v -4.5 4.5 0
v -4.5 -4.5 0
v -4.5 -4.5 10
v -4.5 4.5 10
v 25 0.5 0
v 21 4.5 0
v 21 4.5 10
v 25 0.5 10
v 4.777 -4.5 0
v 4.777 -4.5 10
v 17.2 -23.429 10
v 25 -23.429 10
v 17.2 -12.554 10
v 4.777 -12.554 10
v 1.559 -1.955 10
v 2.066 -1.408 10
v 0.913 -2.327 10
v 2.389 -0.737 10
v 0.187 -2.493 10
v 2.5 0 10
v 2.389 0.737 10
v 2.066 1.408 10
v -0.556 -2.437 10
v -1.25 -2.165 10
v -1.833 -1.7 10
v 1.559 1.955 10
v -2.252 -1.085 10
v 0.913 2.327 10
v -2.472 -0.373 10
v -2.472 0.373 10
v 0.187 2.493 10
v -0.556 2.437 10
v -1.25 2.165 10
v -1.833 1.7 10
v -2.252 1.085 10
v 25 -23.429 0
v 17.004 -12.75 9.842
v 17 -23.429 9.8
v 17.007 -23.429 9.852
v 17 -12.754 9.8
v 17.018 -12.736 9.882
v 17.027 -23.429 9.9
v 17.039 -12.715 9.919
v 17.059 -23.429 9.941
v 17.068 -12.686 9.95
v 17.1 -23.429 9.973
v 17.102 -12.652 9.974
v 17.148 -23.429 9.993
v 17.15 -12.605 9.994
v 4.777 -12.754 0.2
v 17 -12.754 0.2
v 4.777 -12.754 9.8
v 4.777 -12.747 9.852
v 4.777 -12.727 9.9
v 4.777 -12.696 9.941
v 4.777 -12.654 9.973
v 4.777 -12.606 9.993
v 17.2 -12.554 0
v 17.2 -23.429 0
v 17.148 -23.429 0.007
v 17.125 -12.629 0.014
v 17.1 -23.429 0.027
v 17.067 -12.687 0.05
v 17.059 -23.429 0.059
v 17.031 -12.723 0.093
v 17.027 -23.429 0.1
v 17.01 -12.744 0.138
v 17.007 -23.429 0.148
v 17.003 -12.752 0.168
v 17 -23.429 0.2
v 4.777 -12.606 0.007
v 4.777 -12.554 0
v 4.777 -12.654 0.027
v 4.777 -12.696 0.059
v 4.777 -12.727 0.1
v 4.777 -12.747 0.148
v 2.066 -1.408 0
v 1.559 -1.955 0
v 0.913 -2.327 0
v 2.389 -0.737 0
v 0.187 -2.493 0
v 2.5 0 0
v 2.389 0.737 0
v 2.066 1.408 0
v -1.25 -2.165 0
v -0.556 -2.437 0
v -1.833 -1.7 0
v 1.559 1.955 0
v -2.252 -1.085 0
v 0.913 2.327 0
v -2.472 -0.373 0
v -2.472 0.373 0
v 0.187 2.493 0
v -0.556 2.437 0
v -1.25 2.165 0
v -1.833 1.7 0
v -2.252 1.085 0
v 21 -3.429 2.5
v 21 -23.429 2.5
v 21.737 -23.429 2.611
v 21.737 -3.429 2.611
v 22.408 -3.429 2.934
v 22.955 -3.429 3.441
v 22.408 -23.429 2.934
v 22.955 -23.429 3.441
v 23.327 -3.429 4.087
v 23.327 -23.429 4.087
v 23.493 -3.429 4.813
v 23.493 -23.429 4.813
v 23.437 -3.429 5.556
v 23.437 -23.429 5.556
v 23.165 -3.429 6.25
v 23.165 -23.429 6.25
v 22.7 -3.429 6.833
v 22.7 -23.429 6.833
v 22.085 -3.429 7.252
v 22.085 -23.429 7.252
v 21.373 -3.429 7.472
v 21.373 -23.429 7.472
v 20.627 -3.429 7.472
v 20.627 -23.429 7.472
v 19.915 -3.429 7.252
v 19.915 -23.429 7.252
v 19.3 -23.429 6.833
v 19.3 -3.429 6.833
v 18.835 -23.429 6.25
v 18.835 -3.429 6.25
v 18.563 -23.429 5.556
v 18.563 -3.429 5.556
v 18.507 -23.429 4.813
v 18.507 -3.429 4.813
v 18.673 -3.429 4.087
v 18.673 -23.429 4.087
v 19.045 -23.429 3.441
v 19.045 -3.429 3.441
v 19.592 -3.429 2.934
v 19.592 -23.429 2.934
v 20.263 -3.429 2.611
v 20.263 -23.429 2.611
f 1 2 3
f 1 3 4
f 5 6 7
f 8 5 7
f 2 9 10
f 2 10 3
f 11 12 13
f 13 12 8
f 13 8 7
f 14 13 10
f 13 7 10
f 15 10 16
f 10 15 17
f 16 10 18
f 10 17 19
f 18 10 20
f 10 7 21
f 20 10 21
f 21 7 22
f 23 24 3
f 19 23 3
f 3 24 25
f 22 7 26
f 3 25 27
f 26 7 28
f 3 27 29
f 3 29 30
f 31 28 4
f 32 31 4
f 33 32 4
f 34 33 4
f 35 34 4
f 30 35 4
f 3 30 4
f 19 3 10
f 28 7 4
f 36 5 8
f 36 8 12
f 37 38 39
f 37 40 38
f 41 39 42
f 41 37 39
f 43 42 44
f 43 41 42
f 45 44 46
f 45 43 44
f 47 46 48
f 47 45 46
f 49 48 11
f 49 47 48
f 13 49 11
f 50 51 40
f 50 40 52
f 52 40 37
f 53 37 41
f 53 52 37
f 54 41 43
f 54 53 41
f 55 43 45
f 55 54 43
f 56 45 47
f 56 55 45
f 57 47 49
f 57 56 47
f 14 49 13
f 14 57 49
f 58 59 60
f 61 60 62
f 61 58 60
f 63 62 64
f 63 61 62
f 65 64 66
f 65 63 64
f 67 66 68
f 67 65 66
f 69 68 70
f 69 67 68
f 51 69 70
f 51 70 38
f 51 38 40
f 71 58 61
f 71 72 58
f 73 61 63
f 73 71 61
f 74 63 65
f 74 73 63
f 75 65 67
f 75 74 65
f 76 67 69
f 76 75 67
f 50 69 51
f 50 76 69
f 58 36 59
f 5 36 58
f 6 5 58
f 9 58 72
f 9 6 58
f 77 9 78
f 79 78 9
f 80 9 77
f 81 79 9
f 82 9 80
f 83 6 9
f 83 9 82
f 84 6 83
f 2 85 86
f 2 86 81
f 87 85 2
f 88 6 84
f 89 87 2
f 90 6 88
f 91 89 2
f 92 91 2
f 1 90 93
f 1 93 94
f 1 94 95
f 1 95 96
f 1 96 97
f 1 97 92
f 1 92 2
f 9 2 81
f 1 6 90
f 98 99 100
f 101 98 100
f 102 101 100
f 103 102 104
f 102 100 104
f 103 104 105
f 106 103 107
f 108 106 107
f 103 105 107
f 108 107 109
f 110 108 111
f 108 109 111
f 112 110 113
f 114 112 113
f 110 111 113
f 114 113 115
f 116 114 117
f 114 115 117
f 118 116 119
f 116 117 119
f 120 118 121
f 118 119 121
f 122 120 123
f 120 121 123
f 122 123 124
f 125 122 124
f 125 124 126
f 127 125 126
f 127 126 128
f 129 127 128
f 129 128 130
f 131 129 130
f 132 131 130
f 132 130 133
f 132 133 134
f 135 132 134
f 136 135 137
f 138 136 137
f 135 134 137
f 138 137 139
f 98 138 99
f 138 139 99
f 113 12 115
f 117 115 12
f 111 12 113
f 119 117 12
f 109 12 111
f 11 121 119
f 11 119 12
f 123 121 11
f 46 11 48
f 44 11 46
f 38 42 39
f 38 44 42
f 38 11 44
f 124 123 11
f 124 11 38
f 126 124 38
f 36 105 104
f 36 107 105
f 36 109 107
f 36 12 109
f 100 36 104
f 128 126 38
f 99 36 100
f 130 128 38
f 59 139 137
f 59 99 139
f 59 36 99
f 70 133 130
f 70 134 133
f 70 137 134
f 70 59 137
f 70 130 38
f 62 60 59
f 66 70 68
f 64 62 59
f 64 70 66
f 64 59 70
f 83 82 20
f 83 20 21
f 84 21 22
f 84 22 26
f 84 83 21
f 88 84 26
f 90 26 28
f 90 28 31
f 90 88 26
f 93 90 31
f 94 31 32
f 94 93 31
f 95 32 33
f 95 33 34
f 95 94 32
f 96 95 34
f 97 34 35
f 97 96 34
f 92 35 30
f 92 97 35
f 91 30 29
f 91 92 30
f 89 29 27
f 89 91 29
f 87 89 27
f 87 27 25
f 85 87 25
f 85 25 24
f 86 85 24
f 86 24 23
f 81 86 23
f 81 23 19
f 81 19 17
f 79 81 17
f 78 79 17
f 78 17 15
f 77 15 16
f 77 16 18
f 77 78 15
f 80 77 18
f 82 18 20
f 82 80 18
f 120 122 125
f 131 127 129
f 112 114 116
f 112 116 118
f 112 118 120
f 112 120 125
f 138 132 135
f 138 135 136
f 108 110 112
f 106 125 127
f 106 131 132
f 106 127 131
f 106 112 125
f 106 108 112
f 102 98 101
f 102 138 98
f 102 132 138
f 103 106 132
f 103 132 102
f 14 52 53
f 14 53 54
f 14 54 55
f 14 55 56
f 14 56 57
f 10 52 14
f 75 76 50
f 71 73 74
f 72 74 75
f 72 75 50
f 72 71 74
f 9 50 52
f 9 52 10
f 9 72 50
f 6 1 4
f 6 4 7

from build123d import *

# Parameters (mm, degrees)
SKETCH_1_R          = 2.5
EXTRUDE_1_DEPTH     = 10
SKETCH_2_R          = 2.5
CUT_EXTRUDE_1_DEPTH = 20
CHAMFER_1_SIZE      = 4
FILLET_1_R          = 0.2


with BuildPart() as part:
    # Эскиз1 → Вытянуть1 (new body)
    with BuildSketch(Plane.XY):
        Polygon((17.000000013, -23.429402734), (17.000000013, -12.754084516), (4.776542266, -12.754084516), (4.776542266, -4.5), (-4.5, -4.5), (-4.5, 4.5), (25.000000013, 4.5), (25.000000013, -23.429402734), align=None)
        Circle(SKETCH_1_R, mode=Mode.SUBTRACT)
    extrude(amount=EXTRUDE_1_DEPTH)

    # Эскиз2 → Вырез-Вытянуть1 (cut)
    with BuildSketch(Plane.XZ.offset(23.429402734)):
        with Locations(Location((21.000000013, 5, 0), (0, 0, 270))):
            Circle(SKETCH_2_R)
    extrude(amount=-CUT_EXTRUDE_1_DEPTH, mode=Mode.SUBTRACT)

    # Фаска1
    chamfer_1_edges = [part.edges().sort_by_distance(p)[0] for p in [
        (25.000000013, 4.5, 5),
    ]]
    chamfer(chamfer_1_edges, length=CHAMFER_1_SIZE)

    # Скругление1
    fillet_1_edges = [part.edges().sort_by_distance(p)[0] for p in [
        (10.88827114, -12.754084516, 10),
        (17.000000013, -18.091743625, 10),
        (17.000000013, -18.091743625, 0),
        (10.88827114, -12.754084516, 0),
    ]]
    fillet(fillet_1_edges, radius=FILLET_1_R)


solid = part.part
